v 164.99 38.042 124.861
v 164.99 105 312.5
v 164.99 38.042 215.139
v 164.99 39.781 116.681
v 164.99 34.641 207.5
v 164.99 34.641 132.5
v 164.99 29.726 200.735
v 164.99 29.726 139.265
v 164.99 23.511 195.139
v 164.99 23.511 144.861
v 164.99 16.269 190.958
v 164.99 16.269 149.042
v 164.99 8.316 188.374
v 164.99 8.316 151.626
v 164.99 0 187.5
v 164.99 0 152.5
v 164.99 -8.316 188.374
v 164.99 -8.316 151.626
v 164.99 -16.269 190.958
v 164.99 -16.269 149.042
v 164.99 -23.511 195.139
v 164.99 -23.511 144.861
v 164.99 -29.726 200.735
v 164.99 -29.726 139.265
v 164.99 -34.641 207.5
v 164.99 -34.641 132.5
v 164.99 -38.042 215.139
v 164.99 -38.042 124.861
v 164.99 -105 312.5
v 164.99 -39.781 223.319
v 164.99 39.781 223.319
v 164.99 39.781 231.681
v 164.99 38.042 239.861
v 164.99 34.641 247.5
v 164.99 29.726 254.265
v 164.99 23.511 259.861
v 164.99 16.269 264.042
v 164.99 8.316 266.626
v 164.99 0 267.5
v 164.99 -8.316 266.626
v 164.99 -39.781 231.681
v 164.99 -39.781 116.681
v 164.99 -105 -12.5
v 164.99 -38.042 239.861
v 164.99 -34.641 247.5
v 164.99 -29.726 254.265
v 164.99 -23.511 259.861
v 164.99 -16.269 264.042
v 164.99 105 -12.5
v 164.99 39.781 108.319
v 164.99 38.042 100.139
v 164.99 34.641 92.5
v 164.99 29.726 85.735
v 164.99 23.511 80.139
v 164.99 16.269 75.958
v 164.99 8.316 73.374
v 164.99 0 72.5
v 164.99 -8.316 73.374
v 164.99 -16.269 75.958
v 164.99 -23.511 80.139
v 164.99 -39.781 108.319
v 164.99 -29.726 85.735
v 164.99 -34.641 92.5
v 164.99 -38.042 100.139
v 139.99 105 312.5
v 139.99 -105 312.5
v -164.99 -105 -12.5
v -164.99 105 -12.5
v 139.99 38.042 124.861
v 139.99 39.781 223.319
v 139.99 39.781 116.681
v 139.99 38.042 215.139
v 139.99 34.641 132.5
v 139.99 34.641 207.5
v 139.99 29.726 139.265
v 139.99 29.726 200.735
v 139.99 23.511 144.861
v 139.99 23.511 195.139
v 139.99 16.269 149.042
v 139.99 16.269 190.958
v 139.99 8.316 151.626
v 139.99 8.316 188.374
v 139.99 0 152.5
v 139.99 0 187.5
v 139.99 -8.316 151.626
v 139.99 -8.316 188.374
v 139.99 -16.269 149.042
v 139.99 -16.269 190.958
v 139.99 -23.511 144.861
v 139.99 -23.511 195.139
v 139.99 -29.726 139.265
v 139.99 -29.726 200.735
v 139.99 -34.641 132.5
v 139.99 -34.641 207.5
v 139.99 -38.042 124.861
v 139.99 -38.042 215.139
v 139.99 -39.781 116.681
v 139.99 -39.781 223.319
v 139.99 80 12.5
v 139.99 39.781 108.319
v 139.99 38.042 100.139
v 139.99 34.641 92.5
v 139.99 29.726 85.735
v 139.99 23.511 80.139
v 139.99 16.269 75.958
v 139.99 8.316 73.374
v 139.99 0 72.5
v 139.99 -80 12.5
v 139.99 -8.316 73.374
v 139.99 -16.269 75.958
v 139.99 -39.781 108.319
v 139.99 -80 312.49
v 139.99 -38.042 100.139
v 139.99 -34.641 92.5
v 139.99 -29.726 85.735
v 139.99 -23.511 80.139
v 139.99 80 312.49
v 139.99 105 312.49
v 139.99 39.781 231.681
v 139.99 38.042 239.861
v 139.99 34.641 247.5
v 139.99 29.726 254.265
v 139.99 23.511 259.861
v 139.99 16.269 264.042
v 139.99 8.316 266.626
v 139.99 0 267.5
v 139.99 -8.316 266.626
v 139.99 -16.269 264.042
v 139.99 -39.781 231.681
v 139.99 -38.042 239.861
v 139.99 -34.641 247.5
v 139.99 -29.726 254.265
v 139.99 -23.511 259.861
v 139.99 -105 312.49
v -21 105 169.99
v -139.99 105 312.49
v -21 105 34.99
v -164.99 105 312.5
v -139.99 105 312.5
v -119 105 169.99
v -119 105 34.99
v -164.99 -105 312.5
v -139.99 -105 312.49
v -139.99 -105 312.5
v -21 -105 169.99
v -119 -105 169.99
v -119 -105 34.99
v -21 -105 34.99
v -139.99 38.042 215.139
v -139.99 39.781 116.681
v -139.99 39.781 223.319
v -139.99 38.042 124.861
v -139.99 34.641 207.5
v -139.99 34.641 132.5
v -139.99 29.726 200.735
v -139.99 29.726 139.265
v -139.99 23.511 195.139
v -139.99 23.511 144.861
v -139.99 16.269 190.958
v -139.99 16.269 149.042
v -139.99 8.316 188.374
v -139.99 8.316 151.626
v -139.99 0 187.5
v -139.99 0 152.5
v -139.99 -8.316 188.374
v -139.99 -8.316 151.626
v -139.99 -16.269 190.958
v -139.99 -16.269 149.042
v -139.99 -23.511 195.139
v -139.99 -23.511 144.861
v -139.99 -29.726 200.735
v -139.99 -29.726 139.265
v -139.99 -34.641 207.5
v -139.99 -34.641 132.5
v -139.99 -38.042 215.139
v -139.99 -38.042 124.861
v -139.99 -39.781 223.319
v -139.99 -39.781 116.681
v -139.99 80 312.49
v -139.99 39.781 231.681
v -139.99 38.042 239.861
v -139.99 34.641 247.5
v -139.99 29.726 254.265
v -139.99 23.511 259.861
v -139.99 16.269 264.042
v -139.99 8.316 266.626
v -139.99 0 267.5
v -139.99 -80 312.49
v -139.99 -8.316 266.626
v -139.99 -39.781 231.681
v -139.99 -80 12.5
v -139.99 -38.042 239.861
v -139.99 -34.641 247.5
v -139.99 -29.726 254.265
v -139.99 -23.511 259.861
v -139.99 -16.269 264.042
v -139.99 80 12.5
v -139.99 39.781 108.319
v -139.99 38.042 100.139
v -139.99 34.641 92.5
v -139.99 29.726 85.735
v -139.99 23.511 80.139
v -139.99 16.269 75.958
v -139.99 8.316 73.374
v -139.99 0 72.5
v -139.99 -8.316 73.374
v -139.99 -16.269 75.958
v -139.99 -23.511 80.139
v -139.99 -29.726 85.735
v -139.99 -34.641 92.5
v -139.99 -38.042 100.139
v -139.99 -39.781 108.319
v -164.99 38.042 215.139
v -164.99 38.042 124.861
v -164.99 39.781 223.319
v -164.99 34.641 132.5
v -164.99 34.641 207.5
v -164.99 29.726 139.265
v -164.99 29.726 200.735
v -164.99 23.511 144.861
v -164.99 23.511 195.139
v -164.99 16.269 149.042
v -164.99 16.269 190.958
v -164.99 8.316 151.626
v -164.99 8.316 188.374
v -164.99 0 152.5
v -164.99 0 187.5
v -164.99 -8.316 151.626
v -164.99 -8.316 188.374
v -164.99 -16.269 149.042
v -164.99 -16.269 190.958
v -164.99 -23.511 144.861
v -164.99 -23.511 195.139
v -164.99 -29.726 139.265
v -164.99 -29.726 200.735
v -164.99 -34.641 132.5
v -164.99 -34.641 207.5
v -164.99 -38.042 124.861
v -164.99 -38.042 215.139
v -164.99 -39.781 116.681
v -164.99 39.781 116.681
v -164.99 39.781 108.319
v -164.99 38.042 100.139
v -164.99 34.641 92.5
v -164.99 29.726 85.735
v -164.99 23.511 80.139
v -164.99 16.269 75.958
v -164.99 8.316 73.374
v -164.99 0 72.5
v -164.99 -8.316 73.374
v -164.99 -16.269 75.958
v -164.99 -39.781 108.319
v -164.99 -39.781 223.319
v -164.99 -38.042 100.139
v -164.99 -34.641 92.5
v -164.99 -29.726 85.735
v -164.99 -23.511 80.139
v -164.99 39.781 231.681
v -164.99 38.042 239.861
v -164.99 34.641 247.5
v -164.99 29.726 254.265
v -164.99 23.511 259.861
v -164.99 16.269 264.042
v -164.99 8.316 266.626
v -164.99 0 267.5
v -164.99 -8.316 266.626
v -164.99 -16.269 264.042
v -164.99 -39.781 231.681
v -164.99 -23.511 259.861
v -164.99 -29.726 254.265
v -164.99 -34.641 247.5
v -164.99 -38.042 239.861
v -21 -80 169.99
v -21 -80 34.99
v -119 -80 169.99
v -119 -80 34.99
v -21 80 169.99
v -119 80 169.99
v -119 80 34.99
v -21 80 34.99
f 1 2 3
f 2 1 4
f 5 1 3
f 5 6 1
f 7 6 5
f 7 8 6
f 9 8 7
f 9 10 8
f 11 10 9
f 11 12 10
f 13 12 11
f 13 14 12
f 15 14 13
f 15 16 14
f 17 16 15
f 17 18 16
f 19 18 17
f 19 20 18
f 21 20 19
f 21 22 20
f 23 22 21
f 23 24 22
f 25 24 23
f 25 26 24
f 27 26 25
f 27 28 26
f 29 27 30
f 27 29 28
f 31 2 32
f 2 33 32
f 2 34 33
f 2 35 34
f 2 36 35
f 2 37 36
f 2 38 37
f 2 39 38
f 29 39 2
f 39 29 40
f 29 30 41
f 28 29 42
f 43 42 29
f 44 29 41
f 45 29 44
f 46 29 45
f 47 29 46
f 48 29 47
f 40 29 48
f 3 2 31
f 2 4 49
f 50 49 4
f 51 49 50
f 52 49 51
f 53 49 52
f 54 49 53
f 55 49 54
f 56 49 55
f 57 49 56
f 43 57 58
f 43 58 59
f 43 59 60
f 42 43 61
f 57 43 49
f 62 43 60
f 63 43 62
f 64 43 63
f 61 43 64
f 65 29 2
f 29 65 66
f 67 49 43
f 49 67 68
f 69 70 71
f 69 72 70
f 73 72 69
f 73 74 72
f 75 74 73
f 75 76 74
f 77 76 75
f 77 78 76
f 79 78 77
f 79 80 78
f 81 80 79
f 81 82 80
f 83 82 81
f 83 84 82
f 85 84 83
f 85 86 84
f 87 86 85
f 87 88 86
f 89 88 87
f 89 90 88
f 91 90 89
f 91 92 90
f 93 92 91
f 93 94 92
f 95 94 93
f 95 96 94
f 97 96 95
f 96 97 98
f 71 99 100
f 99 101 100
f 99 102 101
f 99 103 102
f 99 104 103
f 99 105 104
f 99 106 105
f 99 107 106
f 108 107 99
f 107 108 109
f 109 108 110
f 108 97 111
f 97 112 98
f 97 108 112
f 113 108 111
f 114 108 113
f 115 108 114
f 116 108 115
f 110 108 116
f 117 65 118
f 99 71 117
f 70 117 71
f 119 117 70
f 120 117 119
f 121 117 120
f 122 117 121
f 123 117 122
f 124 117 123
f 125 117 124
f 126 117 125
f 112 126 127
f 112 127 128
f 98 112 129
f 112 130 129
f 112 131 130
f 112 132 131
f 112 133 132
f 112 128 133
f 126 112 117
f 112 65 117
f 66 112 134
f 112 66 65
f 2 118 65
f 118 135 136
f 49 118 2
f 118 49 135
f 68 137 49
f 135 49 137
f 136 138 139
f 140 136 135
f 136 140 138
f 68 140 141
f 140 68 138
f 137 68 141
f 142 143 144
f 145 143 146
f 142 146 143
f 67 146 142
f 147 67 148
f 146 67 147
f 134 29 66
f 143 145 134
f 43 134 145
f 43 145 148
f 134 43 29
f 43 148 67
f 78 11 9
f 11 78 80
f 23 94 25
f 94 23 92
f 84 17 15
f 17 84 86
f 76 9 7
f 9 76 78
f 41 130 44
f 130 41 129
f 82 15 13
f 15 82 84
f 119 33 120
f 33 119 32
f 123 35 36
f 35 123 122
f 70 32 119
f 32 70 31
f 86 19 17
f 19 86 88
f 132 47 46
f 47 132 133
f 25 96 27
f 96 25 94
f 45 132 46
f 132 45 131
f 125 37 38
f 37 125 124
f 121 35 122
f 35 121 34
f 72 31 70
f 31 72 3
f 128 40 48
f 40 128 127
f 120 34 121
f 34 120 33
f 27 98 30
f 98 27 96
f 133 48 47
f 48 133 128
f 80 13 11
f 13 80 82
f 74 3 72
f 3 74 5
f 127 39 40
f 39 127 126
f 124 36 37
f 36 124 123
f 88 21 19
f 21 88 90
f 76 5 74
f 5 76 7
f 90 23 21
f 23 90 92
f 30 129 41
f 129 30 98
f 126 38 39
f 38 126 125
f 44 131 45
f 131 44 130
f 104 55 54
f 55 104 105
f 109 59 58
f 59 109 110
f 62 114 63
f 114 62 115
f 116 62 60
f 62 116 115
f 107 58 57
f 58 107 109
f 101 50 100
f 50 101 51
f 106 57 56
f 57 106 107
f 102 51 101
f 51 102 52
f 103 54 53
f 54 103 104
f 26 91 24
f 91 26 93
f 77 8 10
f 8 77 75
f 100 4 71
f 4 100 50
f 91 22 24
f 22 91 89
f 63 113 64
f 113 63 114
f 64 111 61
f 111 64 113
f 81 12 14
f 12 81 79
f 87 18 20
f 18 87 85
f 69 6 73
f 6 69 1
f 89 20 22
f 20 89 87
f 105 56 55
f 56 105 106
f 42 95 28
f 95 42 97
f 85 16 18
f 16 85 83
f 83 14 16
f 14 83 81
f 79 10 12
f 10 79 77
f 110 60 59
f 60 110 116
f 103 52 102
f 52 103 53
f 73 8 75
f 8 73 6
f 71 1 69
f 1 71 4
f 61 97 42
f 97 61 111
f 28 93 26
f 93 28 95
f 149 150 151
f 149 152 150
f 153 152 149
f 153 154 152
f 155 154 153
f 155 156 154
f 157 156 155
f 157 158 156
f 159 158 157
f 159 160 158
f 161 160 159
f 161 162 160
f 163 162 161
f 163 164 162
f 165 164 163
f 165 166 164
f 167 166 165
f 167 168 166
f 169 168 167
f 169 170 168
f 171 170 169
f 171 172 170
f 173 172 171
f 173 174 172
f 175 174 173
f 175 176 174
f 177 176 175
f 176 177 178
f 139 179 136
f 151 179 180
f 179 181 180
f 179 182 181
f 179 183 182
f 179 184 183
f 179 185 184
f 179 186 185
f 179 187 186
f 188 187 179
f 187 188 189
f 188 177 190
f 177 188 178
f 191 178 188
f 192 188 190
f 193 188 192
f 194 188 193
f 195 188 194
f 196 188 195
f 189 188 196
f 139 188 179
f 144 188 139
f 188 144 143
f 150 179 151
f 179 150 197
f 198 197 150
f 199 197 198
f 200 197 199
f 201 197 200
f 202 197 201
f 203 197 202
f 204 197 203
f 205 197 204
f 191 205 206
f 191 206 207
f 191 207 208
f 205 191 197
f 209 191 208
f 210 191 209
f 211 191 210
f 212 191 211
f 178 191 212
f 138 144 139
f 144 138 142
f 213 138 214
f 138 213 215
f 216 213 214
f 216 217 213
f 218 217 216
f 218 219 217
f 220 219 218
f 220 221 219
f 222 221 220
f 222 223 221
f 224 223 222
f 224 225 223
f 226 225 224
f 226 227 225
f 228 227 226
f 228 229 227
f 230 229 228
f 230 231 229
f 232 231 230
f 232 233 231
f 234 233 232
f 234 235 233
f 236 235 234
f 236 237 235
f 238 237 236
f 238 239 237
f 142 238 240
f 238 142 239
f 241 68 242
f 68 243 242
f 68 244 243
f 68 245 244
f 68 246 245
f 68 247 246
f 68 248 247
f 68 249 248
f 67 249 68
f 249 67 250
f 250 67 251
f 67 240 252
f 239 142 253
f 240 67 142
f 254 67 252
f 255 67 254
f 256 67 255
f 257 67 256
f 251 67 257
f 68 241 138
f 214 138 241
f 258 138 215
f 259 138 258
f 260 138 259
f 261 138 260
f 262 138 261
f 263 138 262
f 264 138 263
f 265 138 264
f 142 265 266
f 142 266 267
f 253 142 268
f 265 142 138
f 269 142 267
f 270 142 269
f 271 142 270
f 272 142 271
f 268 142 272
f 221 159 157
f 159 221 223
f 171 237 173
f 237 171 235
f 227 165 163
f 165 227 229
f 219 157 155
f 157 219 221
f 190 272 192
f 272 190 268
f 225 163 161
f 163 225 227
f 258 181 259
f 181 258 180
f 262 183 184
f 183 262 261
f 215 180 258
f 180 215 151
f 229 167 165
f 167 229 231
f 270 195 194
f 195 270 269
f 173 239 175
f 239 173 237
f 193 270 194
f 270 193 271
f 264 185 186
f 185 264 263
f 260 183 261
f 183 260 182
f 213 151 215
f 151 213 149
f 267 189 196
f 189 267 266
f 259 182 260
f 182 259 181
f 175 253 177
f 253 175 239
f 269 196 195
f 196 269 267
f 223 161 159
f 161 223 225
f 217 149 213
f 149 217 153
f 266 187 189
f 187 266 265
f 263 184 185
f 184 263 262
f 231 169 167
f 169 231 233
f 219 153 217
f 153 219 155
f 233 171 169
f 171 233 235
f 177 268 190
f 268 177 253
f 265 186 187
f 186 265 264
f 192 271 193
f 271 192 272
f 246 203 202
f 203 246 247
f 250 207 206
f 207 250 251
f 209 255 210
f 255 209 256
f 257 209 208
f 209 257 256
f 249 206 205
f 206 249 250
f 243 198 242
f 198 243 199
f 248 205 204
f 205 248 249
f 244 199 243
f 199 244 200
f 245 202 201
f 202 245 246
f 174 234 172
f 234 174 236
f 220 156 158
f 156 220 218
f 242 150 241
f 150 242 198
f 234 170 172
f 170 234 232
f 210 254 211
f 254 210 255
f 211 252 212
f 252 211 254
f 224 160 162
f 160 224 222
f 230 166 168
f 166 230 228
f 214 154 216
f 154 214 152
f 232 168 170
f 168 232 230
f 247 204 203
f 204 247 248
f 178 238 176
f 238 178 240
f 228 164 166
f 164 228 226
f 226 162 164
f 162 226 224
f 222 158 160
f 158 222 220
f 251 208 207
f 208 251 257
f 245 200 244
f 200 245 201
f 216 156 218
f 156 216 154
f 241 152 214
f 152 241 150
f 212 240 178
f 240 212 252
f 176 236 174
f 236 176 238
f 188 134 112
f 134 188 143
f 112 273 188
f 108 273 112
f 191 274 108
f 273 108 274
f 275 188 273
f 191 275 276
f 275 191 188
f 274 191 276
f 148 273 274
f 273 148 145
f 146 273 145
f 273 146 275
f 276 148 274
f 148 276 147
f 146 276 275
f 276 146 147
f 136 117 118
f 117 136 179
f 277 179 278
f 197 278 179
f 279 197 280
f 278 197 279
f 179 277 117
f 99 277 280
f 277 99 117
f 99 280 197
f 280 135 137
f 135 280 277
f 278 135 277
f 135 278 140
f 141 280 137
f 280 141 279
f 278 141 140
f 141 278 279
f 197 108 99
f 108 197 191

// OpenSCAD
// transmission_case.scad
// Standalone file - includes library and calls case module

include <transmission.scad>;

case();
